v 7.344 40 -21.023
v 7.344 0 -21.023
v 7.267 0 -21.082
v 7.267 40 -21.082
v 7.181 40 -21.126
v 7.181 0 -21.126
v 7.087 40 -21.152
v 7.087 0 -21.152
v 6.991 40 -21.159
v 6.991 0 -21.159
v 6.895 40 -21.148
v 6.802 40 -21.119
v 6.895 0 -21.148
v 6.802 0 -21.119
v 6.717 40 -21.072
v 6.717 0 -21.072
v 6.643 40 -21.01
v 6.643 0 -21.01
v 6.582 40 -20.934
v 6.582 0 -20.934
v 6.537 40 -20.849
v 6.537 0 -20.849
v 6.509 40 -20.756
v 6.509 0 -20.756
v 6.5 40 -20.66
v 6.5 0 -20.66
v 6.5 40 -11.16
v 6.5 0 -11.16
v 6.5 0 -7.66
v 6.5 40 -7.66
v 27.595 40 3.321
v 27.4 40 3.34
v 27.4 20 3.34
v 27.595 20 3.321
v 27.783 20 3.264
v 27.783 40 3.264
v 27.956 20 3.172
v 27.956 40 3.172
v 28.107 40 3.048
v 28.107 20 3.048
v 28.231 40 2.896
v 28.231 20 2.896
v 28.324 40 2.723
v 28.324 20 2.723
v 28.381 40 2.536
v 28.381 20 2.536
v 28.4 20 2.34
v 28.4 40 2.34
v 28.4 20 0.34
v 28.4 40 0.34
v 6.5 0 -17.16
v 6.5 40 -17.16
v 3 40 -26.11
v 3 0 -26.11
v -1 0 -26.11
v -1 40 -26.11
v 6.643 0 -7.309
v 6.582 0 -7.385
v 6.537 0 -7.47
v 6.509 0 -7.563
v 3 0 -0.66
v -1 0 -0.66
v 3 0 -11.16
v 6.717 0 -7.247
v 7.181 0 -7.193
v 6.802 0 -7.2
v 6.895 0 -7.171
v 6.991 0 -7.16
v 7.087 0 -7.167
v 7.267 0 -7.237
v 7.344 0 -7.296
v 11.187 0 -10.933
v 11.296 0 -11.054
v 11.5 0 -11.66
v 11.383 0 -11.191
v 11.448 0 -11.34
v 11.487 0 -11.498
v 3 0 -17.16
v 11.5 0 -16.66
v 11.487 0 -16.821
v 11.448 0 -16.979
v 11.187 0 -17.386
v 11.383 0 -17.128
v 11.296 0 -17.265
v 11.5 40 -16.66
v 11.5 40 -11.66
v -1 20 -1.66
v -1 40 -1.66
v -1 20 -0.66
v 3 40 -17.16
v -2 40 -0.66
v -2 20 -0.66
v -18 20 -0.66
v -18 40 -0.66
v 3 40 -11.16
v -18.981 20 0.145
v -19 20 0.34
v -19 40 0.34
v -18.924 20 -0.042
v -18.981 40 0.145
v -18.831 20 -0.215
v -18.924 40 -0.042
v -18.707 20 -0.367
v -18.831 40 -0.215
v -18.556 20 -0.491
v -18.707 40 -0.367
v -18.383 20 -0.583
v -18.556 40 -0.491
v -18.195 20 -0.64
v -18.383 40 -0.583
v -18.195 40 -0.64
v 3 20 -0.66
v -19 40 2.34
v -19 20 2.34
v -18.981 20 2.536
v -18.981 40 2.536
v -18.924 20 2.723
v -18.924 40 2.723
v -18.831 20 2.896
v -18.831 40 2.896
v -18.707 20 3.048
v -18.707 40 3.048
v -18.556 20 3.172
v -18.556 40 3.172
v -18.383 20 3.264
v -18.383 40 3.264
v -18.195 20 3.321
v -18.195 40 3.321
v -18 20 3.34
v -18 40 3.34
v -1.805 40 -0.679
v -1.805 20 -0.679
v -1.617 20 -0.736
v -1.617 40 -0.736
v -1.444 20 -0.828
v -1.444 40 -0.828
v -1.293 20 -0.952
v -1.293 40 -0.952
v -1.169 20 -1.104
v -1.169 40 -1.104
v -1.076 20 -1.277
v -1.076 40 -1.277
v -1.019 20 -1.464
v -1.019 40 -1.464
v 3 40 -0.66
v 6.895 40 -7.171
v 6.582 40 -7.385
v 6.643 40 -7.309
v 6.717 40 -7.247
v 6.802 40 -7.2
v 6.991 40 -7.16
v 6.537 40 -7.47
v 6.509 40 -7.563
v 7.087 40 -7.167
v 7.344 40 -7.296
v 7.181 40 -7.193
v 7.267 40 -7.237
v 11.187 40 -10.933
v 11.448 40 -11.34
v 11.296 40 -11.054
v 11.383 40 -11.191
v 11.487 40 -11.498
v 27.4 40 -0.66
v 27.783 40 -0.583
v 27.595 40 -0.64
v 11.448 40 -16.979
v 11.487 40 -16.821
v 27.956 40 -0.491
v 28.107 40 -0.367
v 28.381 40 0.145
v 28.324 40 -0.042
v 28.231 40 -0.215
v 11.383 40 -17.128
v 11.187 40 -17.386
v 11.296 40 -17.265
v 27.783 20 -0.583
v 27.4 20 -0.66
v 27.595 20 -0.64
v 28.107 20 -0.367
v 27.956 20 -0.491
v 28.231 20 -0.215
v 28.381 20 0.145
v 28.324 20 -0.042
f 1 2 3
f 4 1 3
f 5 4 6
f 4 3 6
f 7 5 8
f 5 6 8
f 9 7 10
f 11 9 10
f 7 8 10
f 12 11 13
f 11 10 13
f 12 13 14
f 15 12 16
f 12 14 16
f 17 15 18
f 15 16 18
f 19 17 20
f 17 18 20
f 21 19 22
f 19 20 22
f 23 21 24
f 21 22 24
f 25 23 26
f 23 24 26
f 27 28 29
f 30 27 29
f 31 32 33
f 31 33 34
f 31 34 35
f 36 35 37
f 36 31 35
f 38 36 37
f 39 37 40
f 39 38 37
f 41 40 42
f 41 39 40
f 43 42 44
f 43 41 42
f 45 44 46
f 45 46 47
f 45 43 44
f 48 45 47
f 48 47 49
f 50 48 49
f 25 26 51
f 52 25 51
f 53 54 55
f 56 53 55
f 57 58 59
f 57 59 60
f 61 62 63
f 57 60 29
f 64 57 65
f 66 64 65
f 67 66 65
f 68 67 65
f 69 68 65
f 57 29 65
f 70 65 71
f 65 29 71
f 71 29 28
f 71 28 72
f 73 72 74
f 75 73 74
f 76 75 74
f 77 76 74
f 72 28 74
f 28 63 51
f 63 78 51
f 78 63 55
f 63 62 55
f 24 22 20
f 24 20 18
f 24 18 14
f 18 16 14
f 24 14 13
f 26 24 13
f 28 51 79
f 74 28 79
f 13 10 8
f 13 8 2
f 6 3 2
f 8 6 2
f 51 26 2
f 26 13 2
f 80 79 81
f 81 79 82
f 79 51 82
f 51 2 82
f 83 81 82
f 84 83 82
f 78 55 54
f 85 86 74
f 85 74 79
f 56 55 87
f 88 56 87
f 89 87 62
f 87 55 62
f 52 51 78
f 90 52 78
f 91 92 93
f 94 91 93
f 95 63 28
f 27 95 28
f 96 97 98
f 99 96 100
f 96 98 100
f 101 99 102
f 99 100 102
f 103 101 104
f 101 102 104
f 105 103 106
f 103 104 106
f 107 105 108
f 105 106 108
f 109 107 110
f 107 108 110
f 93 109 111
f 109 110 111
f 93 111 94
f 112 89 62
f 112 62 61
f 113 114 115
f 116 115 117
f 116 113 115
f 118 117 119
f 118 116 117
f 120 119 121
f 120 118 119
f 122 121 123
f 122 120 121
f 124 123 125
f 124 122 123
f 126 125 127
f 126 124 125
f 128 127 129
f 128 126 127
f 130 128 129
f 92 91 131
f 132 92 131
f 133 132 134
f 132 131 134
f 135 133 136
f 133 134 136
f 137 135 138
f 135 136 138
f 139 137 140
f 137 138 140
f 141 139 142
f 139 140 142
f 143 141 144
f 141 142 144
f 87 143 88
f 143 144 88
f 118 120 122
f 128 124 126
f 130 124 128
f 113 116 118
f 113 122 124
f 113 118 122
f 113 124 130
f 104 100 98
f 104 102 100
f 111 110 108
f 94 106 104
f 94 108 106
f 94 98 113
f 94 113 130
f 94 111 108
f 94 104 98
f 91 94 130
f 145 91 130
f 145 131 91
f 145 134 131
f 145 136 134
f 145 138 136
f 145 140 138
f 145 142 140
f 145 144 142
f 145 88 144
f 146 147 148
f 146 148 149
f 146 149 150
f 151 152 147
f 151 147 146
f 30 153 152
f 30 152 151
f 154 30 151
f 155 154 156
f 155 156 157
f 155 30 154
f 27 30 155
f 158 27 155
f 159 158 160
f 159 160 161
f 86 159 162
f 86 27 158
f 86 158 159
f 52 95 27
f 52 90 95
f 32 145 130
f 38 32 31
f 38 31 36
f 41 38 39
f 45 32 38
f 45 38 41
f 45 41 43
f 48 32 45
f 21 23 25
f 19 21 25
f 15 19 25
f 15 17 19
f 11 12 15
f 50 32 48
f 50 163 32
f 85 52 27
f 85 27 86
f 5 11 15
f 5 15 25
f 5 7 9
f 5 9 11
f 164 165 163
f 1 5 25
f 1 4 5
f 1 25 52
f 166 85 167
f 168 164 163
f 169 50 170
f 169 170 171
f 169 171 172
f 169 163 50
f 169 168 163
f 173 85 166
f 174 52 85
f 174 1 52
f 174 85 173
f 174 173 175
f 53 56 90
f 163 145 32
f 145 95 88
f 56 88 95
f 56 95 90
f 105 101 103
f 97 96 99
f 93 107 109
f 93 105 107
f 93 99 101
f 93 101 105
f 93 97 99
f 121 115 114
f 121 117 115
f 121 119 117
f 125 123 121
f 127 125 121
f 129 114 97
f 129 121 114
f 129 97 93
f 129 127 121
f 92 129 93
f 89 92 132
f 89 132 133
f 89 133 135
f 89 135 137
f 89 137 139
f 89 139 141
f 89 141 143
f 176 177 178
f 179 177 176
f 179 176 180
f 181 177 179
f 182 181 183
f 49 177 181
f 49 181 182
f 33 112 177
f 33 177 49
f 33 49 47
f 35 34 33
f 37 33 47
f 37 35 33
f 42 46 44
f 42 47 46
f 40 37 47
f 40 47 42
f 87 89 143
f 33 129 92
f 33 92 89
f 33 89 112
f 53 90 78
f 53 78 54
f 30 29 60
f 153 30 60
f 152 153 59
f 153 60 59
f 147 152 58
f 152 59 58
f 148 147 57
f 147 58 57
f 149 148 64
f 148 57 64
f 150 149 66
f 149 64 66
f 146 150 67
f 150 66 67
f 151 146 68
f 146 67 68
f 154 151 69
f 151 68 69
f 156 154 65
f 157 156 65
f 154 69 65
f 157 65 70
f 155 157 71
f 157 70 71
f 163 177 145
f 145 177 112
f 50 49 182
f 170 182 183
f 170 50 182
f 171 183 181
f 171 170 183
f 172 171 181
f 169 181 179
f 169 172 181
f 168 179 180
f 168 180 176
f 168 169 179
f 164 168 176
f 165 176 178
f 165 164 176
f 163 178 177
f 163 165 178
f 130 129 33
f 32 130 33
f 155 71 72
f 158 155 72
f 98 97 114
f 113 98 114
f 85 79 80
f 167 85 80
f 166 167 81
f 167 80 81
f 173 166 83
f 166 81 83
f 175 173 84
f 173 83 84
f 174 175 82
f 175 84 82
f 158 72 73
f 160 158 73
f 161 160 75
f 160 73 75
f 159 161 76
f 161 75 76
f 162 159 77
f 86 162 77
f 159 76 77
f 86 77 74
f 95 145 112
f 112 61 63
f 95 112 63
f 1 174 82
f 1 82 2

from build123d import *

# Parameters (mm, degrees)
MAIN_EXTRUDE_DEPTH = 40
FILLET1_R          = 1
FILLET2_R          = 1
FILLET3_R          = 1
CUT_EXTRUDE1_DEPTH = 20


with BuildPart() as part:
    # Sketch1 → Main-Extrude (new body)
    with BuildSketch(Plane(origin=(0, 0, 0), x_dir=(1, 0, 0), z_dir=(0, 1, 0))):
        with BuildLine():
            Line((6.5, 11.159541063), (6.5, 7.659541063))
            ThreePointArc((6.5, 7.659541063), (6.80229201, 7.200289987), (7.343646203, 7.296350635))
            Line((7.343646203, 7.296350635), (11.187292407, 10.933160207))
            ThreePointArc((11.187292407, 10.933160207), (11.418502152, 11.264125084), (11.5, 11.659541063))
            Line((11.5, 11.659541063), (11.5, 16.659541063))
            ThreePointArc((11.5, 16.659541063), (11.418502152, 17.054957042), (11.187292407, 17.385921919))
            Line((11.187292407, 17.385921919), (7.343646203, 21.022731491))
            ThreePointArc((7.343646203, 21.022731491), (6.80229201, 21.118792139), (6.5, 20.659541063))
            Line((6.5, 20.659541063), (6.5, 17.159541063))
            Line((6.5, 17.159541063), (3, 17.159541063))
            Line((3, 17.159541063), (3, 26.109541063))
            Line((3, 26.109541063), (-1, 26.109541063))
            Line((-1, 26.109541063), (-1, 0.659541063))
            Line((-1, 0.659541063), (-19, 0.659541063))
            Line((-19, 0.659541063), (-19, -3.340458937))
            Line((-19, -3.340458937), (-4.999912017, -3.340458937))
            Line((-4.999912017, -3.340458937), (28.4, -3.340458937))
            Line((28.4, -3.340458937), (28.4, 0.659541063))
            Line((28.4, 0.659541063), (3, 0.659541063))
            Line((3, 0.659541063), (3, 11.159541063))
            Line((3, 11.159541063), (6.5, 11.159541063))
        make_face()
    extrude(amount=MAIN_EXTRUDE_DEPTH)

    # Fillet1
    fillet1_edges = [part.edges().sort_by_distance(p)[0] for p in [
        (28.4, 20, 3.340458937),
        (-19, 20, 3.340458937),
        (28.4, 20, -0.659541063),
    ]]
    fillet(fillet1_edges, radius=FILLET1_R)

    # Fillet2
    fillet2_edges = [part.edges().sort_by_distance(p)[0] for p in [
        (-19, 20, -0.659541063),
    ]]
    fillet(fillet2_edges, radius=FILLET2_R)

    # Fillet3
    fillet3_edges = [part.edges().sort_by_distance(p)[0] for p in [
        (-1, 20, -0.659541063),
    ]]
    fillet(fillet3_edges, radius=FILLET3_R)

    # Sketch5 → Cut-Extrude1 (cut)
    with BuildSketch(Plane.XZ):
        Polygon((-19, -0.659541063), (-4.518354444, -0.659541063), (-4.518354444, -5.516455238), (-1, -5.516455238), (-1, -0.659541063), (3, -0.659541063), (3, -5.516455238), (6.594635696, -5.516455238), (6.594635696, -0.659541063), (28.4, -0.659541063), (28.4, 3.340458937), (-19, 3.340458937), align=None)
    extrude(amount=-CUT_EXTRUDE1_DEPTH, mode=Mode.SUBTRACT)


solid = part.part
